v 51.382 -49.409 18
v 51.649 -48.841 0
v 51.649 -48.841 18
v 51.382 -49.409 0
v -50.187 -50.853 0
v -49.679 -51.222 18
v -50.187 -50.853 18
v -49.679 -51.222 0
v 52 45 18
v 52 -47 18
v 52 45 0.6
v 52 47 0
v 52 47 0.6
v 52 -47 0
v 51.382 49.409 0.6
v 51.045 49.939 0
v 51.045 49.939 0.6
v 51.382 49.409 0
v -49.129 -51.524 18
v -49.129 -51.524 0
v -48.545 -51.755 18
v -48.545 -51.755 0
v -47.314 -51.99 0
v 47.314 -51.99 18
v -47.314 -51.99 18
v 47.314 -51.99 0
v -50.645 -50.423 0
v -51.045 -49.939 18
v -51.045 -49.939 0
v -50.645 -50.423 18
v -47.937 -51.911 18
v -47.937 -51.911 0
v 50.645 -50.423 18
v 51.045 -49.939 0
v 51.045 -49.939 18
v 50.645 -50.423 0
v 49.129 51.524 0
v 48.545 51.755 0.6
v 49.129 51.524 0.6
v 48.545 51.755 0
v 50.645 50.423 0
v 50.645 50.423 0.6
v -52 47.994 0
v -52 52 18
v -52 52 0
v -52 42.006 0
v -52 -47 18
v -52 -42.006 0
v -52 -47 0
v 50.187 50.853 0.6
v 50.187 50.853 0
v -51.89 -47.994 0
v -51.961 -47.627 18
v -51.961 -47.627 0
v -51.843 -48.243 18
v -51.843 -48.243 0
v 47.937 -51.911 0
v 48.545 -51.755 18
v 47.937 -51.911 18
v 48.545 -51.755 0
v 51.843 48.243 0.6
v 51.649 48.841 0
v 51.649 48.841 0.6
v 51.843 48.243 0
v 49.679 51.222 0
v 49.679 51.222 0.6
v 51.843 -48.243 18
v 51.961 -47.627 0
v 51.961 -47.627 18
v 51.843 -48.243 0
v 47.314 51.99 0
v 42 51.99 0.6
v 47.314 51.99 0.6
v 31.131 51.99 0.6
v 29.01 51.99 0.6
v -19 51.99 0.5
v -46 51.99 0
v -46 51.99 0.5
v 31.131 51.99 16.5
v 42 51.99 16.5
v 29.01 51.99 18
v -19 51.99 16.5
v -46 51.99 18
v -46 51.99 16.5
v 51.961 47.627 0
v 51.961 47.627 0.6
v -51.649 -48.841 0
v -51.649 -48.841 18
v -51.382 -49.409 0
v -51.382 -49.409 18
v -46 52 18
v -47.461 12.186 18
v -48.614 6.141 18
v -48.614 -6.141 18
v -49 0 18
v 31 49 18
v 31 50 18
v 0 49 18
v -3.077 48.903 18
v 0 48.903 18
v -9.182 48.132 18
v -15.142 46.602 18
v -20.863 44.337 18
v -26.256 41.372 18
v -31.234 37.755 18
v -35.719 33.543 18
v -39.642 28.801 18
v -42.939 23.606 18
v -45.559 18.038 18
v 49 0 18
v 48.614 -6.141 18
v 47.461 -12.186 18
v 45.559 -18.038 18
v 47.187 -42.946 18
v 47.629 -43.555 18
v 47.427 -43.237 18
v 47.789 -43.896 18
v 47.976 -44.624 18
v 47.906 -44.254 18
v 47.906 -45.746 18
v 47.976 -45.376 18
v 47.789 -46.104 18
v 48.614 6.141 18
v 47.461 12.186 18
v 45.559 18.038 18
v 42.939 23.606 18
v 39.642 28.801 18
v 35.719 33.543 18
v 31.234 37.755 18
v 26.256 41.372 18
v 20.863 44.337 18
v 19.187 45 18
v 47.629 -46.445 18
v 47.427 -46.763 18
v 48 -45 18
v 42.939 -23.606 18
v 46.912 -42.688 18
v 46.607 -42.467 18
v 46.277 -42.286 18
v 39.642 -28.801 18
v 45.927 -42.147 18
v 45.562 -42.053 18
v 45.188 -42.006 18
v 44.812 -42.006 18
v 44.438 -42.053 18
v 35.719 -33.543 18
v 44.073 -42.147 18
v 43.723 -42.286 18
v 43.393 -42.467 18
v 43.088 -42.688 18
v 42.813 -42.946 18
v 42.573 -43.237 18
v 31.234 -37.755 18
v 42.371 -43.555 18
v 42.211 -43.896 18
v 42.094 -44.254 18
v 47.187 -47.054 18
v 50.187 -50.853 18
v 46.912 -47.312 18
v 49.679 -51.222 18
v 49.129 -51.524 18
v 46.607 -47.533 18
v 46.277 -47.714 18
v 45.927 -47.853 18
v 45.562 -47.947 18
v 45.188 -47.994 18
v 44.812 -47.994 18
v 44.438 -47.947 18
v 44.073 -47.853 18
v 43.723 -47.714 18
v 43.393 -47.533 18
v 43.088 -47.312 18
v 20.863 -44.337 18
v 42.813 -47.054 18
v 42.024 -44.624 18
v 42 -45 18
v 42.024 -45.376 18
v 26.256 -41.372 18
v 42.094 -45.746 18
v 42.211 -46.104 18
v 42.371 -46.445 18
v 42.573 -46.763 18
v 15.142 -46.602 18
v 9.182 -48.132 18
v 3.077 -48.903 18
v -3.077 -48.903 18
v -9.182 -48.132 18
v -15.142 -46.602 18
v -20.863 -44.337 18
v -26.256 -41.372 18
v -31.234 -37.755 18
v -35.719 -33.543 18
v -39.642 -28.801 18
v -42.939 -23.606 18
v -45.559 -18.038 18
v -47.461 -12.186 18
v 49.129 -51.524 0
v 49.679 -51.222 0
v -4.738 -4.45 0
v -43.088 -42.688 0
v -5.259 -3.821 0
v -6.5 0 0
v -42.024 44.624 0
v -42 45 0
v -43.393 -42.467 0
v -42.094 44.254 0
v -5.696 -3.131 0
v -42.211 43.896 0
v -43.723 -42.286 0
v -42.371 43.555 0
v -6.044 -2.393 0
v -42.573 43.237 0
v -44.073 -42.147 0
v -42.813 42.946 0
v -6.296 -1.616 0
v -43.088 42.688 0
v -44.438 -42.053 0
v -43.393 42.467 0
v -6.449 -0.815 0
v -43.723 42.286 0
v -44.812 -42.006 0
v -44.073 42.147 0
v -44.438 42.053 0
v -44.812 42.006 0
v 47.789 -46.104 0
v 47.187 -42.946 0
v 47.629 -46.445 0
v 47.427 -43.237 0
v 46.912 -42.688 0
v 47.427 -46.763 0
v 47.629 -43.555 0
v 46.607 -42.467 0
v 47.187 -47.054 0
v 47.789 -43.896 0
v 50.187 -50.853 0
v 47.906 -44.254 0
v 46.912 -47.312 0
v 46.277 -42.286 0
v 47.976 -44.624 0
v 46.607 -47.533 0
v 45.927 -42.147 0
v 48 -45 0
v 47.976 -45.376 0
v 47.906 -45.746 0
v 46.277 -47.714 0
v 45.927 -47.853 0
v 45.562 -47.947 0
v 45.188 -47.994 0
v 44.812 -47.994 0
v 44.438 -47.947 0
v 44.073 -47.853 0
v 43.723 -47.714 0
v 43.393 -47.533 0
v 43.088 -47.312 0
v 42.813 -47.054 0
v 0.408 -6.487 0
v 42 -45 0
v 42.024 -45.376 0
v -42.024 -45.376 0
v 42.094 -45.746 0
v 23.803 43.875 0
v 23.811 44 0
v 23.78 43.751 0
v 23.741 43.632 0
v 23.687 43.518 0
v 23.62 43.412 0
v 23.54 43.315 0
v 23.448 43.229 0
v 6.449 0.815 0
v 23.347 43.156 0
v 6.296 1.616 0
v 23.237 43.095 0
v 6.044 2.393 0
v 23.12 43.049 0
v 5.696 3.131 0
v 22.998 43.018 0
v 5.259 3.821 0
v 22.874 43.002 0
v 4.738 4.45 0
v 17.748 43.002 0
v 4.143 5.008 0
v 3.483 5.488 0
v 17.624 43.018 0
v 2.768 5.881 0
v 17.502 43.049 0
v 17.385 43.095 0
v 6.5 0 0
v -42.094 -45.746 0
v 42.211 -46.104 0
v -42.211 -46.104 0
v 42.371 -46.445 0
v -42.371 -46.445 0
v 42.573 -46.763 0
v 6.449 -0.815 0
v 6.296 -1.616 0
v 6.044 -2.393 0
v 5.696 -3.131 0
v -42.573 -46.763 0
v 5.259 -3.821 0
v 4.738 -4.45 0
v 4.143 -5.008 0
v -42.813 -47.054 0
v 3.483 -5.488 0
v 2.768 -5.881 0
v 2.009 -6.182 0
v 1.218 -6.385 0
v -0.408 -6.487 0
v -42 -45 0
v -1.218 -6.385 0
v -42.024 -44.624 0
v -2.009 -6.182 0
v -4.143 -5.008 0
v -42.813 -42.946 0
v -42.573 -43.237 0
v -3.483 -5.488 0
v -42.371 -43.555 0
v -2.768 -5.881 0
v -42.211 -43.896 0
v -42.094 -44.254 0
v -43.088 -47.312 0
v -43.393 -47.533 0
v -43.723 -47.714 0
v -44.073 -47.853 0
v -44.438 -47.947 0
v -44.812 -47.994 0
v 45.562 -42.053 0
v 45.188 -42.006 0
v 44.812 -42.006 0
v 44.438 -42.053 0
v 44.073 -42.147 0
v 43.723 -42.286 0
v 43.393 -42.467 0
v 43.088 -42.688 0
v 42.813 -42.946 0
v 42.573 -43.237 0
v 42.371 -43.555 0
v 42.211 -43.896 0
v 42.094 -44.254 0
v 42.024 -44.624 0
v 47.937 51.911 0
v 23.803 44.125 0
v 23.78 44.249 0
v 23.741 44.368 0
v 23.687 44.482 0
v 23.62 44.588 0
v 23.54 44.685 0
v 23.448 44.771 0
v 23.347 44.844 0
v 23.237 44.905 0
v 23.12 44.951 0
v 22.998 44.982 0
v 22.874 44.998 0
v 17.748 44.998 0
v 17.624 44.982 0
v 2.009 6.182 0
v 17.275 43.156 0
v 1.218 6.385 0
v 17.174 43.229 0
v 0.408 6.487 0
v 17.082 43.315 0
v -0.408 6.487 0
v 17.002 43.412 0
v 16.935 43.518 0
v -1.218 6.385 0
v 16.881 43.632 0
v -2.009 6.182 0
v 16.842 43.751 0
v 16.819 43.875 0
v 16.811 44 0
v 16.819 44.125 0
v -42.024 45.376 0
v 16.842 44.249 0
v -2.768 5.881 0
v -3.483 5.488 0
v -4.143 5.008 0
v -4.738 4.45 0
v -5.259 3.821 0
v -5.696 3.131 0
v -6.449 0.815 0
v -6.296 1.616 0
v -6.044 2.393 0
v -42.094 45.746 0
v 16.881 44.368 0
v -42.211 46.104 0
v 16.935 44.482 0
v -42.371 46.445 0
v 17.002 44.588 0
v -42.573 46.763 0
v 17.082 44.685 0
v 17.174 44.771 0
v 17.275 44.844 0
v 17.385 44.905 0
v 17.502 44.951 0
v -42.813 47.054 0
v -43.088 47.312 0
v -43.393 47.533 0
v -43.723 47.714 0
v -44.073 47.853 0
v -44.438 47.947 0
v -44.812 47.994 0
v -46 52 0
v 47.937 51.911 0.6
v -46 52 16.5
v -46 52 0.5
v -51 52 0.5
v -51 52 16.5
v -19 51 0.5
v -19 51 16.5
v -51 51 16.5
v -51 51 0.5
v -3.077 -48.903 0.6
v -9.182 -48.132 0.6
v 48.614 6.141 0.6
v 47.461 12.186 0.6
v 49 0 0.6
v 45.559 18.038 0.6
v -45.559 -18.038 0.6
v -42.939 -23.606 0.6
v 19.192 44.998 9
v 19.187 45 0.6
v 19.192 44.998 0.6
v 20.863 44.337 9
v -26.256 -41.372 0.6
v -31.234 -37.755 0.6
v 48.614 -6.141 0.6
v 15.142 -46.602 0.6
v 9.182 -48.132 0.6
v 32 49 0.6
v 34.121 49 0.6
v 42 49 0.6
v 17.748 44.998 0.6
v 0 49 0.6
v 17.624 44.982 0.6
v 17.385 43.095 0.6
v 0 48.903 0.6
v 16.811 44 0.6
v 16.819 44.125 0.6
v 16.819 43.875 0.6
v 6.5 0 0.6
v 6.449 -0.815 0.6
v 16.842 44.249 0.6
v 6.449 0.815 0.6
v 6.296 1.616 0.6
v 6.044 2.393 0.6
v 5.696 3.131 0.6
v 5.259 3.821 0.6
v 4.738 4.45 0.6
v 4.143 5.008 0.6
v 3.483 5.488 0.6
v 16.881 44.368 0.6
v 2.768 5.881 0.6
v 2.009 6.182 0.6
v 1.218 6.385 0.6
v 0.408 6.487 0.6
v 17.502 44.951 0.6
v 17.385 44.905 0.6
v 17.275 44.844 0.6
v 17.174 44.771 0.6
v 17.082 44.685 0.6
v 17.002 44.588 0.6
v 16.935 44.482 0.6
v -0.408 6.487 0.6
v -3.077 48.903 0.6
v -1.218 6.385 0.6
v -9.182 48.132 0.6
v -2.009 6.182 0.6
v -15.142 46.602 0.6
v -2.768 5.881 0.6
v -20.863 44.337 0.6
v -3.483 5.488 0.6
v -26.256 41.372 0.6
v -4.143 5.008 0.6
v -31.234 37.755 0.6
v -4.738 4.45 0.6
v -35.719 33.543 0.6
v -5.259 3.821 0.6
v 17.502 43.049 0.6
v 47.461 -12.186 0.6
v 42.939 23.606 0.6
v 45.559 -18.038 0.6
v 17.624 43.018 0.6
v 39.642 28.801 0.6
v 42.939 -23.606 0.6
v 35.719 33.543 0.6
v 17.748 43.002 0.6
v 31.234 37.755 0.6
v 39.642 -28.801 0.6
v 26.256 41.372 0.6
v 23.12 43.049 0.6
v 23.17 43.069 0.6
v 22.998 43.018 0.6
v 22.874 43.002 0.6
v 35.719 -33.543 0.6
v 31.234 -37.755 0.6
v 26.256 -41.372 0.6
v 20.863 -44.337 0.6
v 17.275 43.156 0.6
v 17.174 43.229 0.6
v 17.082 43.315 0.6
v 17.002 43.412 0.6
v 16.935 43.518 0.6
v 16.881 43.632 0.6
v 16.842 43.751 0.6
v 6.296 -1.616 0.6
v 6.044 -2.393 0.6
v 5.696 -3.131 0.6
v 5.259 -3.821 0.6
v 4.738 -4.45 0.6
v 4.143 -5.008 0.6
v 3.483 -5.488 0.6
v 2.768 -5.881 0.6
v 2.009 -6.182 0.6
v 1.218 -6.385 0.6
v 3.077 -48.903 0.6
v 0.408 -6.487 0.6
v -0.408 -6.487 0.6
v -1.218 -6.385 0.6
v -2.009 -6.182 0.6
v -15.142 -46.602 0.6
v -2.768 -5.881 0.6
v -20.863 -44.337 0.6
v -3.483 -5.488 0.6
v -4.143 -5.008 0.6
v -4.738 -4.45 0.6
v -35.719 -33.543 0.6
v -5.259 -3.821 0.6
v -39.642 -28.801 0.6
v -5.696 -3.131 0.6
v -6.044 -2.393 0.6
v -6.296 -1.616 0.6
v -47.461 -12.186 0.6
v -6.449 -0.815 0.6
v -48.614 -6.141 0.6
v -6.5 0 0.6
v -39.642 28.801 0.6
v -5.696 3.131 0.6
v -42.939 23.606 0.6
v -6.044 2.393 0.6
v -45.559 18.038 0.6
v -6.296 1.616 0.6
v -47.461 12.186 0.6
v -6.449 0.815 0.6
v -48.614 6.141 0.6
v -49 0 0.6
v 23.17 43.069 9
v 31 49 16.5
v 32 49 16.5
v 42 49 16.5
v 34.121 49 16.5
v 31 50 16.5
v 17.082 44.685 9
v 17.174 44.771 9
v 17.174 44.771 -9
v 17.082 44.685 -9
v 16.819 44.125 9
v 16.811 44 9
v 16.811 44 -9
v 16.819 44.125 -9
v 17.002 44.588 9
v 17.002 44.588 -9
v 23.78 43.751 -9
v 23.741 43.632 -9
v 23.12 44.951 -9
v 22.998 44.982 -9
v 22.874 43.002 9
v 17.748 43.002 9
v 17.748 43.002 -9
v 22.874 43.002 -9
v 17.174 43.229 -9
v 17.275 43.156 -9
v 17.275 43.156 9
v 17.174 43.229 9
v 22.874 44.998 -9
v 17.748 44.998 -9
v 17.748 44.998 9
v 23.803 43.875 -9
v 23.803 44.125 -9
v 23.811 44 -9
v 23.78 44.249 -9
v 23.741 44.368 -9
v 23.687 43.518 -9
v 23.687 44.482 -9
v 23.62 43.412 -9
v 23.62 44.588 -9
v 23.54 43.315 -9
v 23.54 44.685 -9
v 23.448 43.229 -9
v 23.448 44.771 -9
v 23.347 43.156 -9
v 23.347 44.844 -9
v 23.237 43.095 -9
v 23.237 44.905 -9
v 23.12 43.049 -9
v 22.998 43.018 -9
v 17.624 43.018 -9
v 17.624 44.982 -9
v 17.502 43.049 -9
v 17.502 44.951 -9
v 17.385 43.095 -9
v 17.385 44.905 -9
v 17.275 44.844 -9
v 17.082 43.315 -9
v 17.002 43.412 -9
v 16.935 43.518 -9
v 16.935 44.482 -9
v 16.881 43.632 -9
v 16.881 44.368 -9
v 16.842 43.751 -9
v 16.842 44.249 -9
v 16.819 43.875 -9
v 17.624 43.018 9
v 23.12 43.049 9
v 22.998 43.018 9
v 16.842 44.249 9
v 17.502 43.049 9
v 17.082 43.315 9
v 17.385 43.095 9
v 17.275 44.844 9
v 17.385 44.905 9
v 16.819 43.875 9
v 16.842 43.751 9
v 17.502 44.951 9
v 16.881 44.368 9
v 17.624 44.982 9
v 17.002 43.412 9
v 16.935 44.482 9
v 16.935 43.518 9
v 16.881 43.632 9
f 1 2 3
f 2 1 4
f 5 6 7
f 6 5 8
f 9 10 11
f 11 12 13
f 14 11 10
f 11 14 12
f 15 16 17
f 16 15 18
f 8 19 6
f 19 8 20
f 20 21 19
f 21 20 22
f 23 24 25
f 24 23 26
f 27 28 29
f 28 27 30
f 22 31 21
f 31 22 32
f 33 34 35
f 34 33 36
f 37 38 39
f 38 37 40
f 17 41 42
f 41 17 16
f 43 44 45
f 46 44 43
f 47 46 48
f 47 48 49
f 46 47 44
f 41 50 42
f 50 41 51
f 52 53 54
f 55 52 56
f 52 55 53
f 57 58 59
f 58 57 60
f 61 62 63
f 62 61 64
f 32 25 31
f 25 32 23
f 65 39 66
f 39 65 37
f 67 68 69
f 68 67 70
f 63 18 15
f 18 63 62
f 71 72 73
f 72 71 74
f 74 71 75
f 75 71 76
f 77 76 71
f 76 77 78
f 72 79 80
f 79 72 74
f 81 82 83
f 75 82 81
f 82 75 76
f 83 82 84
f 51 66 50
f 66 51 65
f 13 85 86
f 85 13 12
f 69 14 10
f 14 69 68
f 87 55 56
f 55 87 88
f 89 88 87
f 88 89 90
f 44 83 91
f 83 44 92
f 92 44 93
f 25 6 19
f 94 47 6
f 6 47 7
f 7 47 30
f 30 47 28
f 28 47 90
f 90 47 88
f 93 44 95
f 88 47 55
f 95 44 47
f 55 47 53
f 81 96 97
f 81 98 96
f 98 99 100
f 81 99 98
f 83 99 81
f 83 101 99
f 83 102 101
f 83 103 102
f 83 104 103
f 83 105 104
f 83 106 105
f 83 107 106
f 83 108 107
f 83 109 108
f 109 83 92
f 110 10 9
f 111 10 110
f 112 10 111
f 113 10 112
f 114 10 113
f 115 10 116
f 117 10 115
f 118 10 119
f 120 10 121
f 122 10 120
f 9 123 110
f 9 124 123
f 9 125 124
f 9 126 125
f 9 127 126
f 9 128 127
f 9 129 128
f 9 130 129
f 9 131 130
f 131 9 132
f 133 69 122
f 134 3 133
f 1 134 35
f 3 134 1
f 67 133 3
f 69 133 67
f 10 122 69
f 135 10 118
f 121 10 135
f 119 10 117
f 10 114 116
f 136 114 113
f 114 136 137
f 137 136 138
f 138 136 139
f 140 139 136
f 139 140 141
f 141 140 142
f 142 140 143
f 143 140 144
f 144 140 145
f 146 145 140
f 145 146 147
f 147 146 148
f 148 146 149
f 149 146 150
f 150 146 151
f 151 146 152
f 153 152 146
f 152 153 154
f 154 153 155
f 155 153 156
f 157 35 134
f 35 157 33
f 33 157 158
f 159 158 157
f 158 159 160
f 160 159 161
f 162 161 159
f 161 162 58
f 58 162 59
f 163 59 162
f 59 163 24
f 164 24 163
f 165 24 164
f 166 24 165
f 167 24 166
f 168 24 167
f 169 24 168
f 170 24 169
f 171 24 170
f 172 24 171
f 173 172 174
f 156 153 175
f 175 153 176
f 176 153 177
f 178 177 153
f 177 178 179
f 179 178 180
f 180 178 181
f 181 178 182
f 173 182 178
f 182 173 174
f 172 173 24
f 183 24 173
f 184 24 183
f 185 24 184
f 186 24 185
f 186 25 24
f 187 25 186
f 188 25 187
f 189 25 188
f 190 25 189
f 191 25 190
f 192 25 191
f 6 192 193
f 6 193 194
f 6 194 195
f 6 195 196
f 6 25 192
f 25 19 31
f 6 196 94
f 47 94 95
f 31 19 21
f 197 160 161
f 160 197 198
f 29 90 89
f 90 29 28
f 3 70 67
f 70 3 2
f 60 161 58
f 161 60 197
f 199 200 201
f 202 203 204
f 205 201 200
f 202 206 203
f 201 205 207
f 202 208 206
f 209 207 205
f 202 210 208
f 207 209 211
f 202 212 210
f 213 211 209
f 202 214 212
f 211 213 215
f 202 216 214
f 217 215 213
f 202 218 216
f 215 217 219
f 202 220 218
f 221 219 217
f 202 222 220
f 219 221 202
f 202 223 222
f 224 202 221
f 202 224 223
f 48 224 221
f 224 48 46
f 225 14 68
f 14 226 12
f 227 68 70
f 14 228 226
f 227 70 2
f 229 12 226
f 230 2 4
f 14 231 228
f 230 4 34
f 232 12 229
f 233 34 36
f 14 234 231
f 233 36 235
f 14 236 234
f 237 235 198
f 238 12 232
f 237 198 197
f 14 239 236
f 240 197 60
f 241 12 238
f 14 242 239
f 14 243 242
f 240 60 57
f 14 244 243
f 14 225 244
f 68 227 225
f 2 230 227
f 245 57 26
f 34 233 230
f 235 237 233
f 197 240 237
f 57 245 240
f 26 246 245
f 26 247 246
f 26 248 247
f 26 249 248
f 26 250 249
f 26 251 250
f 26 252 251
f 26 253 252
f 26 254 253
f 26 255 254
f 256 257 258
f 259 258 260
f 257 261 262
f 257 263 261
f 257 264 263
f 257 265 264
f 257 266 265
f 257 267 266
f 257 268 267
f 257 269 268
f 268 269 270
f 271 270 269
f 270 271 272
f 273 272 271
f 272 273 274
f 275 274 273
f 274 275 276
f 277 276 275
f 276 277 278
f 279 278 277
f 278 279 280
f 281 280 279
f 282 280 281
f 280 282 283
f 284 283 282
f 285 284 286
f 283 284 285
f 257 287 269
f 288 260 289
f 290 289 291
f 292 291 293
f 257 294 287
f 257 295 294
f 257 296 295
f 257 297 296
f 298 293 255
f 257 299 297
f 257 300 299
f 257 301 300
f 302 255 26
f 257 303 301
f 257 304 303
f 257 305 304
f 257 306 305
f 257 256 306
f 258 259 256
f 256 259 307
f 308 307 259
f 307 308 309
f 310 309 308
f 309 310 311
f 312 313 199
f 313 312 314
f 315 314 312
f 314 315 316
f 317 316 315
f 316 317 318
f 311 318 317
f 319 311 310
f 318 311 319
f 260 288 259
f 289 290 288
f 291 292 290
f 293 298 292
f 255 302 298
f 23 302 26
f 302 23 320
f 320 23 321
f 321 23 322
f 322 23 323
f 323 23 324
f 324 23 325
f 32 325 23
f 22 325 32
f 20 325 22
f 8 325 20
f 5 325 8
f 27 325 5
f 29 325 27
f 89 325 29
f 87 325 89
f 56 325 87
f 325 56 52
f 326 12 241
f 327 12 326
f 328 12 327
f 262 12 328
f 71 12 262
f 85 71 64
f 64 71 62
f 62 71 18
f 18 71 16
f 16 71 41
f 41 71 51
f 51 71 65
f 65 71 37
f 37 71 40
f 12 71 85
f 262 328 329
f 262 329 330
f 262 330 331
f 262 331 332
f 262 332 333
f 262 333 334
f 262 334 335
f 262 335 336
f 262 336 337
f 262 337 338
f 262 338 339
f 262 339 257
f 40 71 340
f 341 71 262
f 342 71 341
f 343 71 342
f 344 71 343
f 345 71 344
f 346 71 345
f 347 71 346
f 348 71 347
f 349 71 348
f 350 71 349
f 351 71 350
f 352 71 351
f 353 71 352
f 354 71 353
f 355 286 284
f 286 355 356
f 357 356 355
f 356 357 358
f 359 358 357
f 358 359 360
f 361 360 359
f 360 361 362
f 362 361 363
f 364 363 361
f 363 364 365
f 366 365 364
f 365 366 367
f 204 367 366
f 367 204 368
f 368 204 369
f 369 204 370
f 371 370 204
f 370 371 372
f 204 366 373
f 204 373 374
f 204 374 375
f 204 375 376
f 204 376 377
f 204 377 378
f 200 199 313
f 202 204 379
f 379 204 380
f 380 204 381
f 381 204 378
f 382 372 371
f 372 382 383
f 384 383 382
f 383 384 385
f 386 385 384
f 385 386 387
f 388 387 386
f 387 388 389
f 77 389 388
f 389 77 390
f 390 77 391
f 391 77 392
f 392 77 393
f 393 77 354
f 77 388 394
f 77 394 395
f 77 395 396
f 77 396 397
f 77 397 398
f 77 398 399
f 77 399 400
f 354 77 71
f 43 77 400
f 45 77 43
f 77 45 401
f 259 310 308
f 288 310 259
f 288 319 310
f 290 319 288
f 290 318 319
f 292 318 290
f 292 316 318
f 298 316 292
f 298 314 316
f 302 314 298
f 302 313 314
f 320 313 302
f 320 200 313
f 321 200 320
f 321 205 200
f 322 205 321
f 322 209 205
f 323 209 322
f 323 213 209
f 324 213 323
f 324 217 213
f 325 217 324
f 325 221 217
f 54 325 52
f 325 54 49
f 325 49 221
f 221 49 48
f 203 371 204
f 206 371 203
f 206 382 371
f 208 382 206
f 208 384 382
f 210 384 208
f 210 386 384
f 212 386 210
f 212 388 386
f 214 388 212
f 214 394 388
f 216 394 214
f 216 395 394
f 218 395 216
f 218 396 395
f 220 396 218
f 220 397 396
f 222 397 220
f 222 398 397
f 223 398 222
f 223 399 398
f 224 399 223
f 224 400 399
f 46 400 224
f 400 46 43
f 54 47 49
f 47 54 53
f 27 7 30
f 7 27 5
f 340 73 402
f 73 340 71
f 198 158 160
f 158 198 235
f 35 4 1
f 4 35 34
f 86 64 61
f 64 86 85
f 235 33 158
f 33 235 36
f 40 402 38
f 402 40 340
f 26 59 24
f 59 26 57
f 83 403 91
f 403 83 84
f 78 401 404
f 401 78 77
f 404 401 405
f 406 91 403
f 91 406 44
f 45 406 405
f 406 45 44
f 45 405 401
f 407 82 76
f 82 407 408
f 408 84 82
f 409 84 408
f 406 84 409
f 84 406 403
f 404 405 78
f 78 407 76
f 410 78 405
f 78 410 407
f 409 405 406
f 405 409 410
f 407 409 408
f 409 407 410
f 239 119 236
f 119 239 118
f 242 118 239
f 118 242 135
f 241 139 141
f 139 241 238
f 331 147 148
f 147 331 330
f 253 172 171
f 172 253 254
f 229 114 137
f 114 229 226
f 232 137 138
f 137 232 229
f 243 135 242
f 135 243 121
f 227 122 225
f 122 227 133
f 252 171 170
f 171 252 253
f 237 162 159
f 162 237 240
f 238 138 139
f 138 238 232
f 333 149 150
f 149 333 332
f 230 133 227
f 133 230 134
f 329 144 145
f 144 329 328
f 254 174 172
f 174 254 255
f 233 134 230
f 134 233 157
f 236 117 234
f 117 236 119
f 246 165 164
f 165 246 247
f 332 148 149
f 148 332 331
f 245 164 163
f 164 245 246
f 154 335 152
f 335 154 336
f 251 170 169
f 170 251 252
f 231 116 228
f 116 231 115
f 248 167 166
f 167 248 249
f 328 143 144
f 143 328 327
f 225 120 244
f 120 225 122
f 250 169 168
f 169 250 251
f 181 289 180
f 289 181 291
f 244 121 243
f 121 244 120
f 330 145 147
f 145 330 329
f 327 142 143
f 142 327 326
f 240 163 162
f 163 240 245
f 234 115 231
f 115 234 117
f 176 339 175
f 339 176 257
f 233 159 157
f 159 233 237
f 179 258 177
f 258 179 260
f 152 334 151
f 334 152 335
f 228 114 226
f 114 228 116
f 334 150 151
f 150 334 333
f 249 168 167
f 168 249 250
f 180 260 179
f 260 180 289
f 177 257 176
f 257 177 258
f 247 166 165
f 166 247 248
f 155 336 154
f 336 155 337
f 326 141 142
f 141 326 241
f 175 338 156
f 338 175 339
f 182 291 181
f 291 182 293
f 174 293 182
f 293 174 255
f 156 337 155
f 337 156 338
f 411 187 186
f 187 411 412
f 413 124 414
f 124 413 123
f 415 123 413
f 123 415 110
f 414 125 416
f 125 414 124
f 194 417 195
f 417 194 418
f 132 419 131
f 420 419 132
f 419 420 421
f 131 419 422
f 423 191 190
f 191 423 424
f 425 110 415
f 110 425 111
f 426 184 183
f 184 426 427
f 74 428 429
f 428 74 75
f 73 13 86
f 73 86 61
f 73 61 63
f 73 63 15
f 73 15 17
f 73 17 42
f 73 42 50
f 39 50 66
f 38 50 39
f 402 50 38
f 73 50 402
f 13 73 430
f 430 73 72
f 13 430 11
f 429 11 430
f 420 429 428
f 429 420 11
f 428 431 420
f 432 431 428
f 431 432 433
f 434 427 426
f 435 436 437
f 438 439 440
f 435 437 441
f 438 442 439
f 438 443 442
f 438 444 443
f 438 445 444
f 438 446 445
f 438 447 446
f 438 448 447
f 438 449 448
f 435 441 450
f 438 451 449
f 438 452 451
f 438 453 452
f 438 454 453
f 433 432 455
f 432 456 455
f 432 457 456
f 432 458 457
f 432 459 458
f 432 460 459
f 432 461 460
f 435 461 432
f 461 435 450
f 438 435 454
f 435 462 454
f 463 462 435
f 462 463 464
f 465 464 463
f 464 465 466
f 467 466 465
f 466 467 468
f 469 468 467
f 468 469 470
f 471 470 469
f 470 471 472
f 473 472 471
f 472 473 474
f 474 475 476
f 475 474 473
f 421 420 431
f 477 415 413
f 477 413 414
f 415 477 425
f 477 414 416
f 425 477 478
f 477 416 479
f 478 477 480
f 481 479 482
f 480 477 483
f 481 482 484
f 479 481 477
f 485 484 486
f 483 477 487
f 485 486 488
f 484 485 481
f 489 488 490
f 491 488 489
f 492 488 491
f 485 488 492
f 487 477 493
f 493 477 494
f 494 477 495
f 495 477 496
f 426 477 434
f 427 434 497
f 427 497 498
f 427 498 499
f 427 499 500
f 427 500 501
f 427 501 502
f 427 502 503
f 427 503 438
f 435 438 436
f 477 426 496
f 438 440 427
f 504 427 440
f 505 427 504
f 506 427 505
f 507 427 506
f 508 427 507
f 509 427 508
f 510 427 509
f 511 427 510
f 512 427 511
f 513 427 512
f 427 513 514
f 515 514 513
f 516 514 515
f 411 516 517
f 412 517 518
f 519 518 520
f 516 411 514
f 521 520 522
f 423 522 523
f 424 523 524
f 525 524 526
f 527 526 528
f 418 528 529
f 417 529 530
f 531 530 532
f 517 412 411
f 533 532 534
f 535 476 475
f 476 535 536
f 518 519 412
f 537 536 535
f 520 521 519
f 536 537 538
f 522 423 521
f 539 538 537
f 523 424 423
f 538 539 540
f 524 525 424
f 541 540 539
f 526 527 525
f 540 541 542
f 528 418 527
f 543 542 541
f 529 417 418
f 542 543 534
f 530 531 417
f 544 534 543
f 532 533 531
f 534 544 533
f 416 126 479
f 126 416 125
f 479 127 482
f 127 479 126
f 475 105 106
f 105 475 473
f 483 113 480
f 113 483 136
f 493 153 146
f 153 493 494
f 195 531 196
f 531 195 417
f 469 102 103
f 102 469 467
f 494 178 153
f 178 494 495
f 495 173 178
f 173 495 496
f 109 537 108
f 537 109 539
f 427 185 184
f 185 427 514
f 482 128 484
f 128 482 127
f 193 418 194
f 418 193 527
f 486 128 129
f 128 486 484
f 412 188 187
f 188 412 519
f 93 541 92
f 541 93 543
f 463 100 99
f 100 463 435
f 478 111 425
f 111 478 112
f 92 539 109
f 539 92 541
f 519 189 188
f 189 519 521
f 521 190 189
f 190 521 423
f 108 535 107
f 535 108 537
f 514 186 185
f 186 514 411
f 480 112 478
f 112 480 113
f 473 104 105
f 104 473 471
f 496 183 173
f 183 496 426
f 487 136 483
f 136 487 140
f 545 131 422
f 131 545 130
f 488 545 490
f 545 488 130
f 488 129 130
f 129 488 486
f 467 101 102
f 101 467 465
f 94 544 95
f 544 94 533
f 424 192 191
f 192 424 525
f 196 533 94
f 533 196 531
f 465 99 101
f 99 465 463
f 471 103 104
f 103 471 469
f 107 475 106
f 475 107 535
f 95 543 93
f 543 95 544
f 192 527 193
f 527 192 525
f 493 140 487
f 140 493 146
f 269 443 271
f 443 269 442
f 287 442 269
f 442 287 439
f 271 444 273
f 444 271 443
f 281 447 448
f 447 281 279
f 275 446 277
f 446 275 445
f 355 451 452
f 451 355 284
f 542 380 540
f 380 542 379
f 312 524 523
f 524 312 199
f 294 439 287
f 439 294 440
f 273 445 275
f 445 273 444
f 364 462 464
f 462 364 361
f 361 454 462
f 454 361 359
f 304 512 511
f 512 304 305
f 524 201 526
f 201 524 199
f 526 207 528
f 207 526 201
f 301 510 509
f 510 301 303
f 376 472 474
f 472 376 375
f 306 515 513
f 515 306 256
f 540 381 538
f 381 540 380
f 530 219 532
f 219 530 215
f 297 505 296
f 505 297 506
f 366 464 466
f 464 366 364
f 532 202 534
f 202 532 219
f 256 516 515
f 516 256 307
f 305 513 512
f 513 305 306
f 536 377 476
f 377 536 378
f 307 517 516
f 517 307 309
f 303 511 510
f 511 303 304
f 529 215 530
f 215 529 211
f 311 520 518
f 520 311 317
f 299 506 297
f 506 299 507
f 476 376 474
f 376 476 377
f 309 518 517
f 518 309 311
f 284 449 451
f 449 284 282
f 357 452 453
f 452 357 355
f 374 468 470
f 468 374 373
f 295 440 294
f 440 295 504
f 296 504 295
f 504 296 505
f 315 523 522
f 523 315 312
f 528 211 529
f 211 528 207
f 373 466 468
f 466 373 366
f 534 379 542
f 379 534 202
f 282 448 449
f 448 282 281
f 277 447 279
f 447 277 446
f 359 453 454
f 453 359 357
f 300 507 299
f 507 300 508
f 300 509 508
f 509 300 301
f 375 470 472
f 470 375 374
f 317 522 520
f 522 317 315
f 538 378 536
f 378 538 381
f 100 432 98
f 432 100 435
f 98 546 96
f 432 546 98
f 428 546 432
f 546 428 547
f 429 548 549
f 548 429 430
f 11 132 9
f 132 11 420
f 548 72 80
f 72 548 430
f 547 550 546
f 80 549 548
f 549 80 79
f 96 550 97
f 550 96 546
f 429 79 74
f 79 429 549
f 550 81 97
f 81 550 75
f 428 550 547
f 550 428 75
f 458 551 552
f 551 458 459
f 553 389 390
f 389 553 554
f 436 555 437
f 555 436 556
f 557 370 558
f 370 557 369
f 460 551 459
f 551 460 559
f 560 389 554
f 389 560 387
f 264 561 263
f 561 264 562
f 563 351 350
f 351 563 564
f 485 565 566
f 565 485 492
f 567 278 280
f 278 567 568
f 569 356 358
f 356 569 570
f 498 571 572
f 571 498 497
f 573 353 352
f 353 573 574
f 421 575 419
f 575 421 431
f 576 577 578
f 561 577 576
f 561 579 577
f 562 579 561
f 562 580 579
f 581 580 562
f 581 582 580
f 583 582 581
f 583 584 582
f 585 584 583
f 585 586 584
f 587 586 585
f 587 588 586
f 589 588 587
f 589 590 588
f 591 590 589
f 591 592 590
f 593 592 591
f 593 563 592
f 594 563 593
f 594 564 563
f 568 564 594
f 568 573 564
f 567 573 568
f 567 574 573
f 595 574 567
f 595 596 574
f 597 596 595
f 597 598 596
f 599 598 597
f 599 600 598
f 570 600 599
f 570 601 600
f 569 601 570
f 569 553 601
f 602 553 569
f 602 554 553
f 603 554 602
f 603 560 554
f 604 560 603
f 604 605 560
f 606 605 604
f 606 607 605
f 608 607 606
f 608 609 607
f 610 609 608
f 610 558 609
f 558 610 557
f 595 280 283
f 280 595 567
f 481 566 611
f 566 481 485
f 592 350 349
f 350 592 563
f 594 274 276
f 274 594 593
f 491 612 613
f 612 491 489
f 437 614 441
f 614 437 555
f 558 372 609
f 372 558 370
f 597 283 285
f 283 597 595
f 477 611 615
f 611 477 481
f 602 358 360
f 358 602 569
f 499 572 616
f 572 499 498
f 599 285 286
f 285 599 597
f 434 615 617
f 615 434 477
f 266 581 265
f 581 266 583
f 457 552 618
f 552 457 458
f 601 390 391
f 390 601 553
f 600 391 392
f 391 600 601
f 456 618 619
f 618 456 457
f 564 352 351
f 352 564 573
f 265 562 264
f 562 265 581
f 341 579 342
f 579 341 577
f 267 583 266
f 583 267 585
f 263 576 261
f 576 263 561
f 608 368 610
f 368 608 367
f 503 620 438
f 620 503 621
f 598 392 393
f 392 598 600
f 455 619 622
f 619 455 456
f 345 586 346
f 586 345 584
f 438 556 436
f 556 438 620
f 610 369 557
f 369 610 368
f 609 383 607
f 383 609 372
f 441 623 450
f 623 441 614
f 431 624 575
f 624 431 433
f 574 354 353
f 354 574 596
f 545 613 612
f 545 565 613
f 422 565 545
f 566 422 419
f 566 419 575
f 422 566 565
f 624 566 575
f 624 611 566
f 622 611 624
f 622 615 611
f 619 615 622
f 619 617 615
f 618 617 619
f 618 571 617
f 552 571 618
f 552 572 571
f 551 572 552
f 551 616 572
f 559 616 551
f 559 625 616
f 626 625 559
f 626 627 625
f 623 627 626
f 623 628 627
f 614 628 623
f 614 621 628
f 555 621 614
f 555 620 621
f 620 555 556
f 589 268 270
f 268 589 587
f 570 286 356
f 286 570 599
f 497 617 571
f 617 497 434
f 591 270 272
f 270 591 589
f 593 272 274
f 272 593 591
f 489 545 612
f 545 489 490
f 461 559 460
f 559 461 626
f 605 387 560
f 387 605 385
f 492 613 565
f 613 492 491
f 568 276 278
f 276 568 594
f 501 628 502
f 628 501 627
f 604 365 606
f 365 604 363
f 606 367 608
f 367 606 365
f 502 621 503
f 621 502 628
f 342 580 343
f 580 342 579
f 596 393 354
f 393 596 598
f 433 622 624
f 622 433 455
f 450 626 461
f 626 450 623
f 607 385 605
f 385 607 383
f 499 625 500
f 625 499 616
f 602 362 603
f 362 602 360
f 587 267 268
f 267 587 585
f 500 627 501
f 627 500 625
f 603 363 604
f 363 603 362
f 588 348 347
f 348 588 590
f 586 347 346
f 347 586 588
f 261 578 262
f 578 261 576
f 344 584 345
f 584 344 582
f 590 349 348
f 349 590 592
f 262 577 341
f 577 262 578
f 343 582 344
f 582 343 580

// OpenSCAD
$fn = 50;


union() {
	difference() {
		union() {
			hull() {
				translate(v = [-47.0000000000, 47.0000000000, 0]) {
					cylinder(h = 18, r = 5);
				}
				translate(v = [47.0000000000, 47.0000000000, 0]) {
					cylinder(h = 18, r = 5);
				}
				translate(v = [-47.0000000000, -47.0000000000, 0]) {
					cylinder(h = 18, r = 5);
				}
				translate(v = [47.0000000000, -47.0000000000, 0]) {
					cylinder(h = 18, r = 5);
				}
			}
			translate(v = [-52.0000000000, 46.0000000000, 0]) {
				cube(size = [6, 6, 18]);
			}
		}
		union() {
			translate(v = [-52.5000000000, -45.0000000000, -250.0000000000]) {
				rotate(a = [0, 0, 0]) {
					difference() {
						union() {
							hull() {
								translate(v = [7.5000000000, 0, 0]) {
									cylinder(h = 250, r = 3.0000000000, r1 = 3.0000000000, r2 = 3.0000000000);
								}
								translate(v = [-7.5000000000, 0, 0]) {
									cylinder(h = 250, r = 3.0000000000, r1 = 3.0000000000, r2 = 3.0000000000);
								}
							}
						}
						union();
					}
				}
			}
			translate(v = [-52.5000000000, 45.0000000000, -250.0000000000]) {
				rotate(a = [0, 0, 0]) {
					difference() {
						union() {
							hull() {
								translate(v = [7.5000000000, 0, 0]) {
									cylinder(h = 250, r = 3.0000000000, r1 = 3.0000000000, r2 = 3.0000000000);
								}
								translate(v = [-7.5000000000, 0, 0]) {
									cylinder(h = 250, r = 3.0000000000, r1 = 3.0000000000, r2 = 3.0000000000);
								}
							}
						}
						union();
					}
				}
			}
			translate(v = [-51.0000000000, 51.0000000000, 0.5000000000]) {
				cube(size = [32, 1, 16]);
			}
			translate(v = [45.0000000000, -45.0000000000, 0]) {
				cylinder(h = 100, r = 3.0000000000);
			}
			translate(v = [0, 0, 0.6000000000]) {
				cylinder(h = 20.4000000000, r = 49.0000000000);
			}
			translate(v = [0, 0, -9.0000000000]) {
				cylinder(h = 18, r = 6.5000000000);
			}
			translate(v = [0.0000000000, 45.0000000000, 0.6000000000]) {
				cube(size = [52.0000000000, 4, 20.4000000000]);
			}
			translate(v = [42.0000000000, 45.0000000000, 0.6000000000]) {
				cube(size = [10, 7, 20.4000000000]);
			}
			translate(v = [31.0000000000, 45.0000000000, 16.5000000000]) {
				cube(size = [21, 7, 1.5000000000]);
			}
			translate(v = [28.2500000000, 52.7500000000, 0.6000000000]) {
				rotate(a = [0, 0, -45]) {
					cube(size = [7.5000000000, 1.5000000000, 20.4000000000]);
				}
			}
			translate(v = [11.0610000000, 43.0000000000, 0.6000000000]) {
				cube(size = [7.5000000000, 2, 17.4000000000]);
			}
		}
	}
	union() {
		translate(v = [20.3110000000, 44.0000000000, -9.0000000000]) {
			rotate(a = [0, 0, 0]) {
				difference() {
					union() {
						#hull() {
							#translate(v = [2.5000000000, 0, 0]) {
								cylinder(h = 18, r = 1.0000000000, r1 = 1.0000000000, r2 = 1.0000000000);
							}
							#translate(v = [-2.5000000000, 0, 0]) {
								cylinder(h = 18, r = 1.0000000000, r1 = 1.0000000000, r2 = 1.0000000000);
							}
						}
					}
					union();
				}
			}
		}
	}
}
